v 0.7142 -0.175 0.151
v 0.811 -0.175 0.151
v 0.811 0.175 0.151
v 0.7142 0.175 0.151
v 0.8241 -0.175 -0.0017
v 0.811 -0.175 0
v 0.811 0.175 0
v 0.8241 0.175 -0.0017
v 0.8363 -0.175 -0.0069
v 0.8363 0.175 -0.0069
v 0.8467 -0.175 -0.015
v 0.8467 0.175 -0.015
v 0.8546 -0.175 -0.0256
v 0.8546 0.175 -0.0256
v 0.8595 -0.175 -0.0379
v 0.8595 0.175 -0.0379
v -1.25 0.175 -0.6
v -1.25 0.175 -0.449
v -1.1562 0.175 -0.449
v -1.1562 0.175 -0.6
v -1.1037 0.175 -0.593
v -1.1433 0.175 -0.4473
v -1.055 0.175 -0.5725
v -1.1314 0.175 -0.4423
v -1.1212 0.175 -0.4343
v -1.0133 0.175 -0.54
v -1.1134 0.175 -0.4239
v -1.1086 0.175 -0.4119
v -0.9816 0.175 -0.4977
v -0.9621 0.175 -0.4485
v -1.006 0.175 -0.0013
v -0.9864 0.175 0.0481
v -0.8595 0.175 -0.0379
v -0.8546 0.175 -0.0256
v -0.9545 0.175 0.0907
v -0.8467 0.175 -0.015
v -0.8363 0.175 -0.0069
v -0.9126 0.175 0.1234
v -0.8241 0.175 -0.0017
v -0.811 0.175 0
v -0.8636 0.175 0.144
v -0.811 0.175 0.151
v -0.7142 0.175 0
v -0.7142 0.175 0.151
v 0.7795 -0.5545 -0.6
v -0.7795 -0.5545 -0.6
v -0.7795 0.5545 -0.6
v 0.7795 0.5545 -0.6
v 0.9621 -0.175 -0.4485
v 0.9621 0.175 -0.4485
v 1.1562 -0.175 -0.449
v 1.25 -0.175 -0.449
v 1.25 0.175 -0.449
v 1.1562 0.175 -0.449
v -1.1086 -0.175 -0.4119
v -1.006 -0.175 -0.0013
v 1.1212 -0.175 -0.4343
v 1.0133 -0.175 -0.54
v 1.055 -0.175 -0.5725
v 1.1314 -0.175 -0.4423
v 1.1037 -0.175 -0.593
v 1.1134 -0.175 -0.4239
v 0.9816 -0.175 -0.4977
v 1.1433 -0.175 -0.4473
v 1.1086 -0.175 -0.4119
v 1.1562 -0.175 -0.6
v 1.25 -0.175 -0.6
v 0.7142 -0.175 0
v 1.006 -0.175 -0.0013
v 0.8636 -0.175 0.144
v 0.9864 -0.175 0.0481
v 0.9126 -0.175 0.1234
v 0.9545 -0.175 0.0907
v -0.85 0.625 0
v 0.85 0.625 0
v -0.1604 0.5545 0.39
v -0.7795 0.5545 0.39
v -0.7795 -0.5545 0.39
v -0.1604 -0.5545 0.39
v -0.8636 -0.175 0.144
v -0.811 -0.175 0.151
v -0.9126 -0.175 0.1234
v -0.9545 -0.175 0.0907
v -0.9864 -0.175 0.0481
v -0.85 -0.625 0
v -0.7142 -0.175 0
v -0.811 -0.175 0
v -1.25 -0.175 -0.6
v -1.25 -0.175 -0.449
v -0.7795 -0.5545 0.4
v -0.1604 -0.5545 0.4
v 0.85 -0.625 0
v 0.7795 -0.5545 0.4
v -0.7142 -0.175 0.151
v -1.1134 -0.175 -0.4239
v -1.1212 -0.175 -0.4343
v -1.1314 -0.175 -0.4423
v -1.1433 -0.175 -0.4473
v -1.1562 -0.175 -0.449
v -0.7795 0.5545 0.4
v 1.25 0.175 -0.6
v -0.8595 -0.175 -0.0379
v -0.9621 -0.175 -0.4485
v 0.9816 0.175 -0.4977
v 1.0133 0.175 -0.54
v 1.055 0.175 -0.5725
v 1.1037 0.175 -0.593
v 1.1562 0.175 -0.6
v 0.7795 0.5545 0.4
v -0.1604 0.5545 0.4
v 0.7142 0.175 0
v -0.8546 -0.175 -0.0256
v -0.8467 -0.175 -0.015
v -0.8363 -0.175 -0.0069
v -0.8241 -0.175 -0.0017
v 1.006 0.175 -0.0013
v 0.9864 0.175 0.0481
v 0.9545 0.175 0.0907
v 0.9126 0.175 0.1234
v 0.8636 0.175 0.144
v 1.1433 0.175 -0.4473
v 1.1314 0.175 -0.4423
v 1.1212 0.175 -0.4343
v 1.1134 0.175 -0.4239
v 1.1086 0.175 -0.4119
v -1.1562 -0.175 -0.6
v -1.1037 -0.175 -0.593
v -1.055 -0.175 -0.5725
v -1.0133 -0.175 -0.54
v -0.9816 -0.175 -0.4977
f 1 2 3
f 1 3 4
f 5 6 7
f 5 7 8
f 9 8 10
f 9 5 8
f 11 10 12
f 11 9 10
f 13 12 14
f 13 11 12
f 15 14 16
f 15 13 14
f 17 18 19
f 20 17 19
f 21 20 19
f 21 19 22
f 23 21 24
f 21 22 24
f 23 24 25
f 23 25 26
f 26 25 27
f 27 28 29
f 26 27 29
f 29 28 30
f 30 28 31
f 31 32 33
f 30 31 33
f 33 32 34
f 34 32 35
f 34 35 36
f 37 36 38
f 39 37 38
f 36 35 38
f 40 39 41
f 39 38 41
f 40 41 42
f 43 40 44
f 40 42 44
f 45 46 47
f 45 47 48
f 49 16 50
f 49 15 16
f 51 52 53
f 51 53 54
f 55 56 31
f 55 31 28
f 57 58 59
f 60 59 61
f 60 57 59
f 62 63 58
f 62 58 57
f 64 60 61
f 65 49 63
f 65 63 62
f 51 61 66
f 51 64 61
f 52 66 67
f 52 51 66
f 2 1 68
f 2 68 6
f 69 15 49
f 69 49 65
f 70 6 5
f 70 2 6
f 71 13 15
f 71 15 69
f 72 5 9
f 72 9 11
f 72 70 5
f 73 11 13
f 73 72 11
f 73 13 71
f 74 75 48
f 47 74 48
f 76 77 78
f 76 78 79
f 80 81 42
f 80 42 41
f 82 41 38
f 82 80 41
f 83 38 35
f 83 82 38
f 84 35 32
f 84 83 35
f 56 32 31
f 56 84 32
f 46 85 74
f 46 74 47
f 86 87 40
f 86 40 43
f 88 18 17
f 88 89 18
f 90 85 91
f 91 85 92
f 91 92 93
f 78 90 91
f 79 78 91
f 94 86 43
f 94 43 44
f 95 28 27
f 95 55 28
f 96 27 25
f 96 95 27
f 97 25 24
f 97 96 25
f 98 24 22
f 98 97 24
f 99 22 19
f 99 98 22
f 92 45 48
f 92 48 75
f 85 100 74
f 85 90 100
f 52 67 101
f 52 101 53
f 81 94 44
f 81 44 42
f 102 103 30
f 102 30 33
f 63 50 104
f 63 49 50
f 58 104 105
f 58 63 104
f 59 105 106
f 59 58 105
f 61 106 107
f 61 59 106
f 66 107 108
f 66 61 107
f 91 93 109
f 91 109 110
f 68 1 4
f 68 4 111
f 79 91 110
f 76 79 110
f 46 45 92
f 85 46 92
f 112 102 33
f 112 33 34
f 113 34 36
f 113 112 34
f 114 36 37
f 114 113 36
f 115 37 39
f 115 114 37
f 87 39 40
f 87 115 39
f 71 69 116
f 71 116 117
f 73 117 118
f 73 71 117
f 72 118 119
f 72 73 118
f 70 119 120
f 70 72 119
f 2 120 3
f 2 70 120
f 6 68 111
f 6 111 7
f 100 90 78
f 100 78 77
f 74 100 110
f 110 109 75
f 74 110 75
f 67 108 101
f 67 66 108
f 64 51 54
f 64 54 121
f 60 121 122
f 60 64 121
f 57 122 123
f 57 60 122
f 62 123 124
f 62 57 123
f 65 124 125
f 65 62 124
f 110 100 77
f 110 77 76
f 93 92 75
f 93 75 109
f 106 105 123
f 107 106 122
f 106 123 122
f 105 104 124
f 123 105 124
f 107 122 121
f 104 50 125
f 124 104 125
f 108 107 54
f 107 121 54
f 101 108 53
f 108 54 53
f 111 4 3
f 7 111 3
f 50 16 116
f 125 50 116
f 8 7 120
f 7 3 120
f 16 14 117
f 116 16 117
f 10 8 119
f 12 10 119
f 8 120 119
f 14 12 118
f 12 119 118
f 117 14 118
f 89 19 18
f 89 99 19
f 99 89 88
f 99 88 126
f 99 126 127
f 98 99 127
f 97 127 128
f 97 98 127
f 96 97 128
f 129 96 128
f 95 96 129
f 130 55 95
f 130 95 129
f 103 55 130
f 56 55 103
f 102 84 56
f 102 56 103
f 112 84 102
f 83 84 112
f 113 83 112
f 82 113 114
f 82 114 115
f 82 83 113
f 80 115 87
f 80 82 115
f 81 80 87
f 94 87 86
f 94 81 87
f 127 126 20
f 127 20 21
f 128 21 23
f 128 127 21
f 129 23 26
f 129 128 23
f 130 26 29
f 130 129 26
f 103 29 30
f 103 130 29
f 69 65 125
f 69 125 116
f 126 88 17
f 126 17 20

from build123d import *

# Parameters (mm, degrees)
F1_DEPTH      = 0.625
F3_DEPTH      = 0.851
F3_DEPTH_BACK = 0.851
F5_DEPTH      = 0.175
F6_W          = 0.6190498838
F6_H          = 1.1089384154
F7_DEPTH      = 0.01


with BuildPart() as f1:
    # F0 (on Front) → F1 (new body, symmetric)
    with BuildSketch(Plane.XZ):
        Polygon((-0.7794692077, 0.4), (-0.85, 0), (0, 0), (0, 0.4), align=None)
        Polygon((0, 0), (-0.85, 0), (-0.7794692077, -0.6), (0, -0.6), align=None)
        Polygon((0, 0.4), (0, 0), (0.85, 0), (0.7794692077, 0.4), align=None)
        Polygon((0.85, 0), (0, 0), (0, -0.6), (0.7794692077, -0.6), align=None)
    extrude(amount=F1_DEPTH, both=True)

    # F2 (on Right) → F3 (cut, two sides)
    with BuildSketch(Plane.YZ) as f3_sk:
        Polygon((-0.625, 0.4), (-0.625, 0), (-0.5544692077, 0.4), align=None)
        Polygon((-0.5544692077, -0.6), (-0.625, 0), (-0.625, -0.6), align=None)
        Polygon((0.5544692077, -0.6), (0.625, -0.6), (0.625, 0), align=None)
        Polygon((0.5544692077, 0.4), (0.625, 0), (0.625, 0.4), align=None)
    extrude(amount=-F3_DEPTH, mode=Mode.SUBTRACT)
    extrude(f3_sk.sketch, amount=F3_DEPTH_BACK, mode=Mode.SUBTRACT)

    # F6 (on face) → F7 (cut)
    with BuildSketch(Plane.XY.offset(0.4)):
        with Locations((-0.4699442658, 0)):
            Rectangle(F6_W, F6_H)
    extrude(amount=-F7_DEPTH, mode=Mode.SUBTRACT)


with BuildPart() as f5:
    # F4 (on Front) → F5 (new body, symmetric)
    with BuildSketch(Plane.XZ):
        with BuildLine():
            Line((1.1561552813, -0.6), (1.25, -0.6))
            Line((1.25, -0.6), (1.25, -0.4489999779))
            Line((1.25, -0.4489999779), (1.1561552813, -0.4489999779))
            ThreePointArc((1.1561552813, -0.4489999779), (1.1260000966, -0.438622049), (1.1086183202, -0.4118842403))
            Line((1.1086183202, -0.4118842403), (1.0059598437, -0.001250334))
            ThreePointArc((1.0059598437, -0.001250334), (0.9346590474, 0.1084293105), (0.8109611797, 0.1510000221))
            Line((0.8109611797, 0.1510000221), (0.7142239483, 0.1510000221))
            Line((0.7142239483, 0.1510000221), (0.7142239483, 0))
            Line((0.7142239483, 0), (0.8109611797, 0))
            ThreePointArc((0.8109611797, 0), (0.8417317901, -0.0105897281), (0.8594683047, -0.0378732187))
            Line((0.8594683047, -0.0378732187), (0.9621267813, -0.448507125))
            ThreePointArc((0.9621267813, -0.448507125), (1.0330728394, -0.5576410876), (1.1561552813, -0.6))
        make_face()
    extrude(amount=F5_DEPTH, both=True)


with BuildPart() as f5b:
    # F4 (on Front) → F5, piece 2 (new body, symmetric)
    with BuildSketch(Plane.XZ):
        with BuildLine():
            Line((-1.25, -0.4489999779), (-1.25, -0.6))
            Line((-1.25, -0.6), (-1.1561552813, -0.6))
            ThreePointArc((-1.1561552813, -0.6), (-1.0330728394, -0.5576410876), (-0.9621267813, -0.448507125))
            Line((-0.9621267813, -0.448507125), (-0.8594683047, -0.0378732187))
            ThreePointArc((-0.8594683047, -0.0378732187), (-0.8417317901, -0.0105897281), (-0.8109611797, 0))
            Line((-0.8109611797, 0), (-0.7142239483, 0))
            Line((-0.7142239483, 0), (-0.7142239483, 0.1510000221))
            Line((-0.7142239483, 0.1510000221), (-0.8109611797, 0.1510000221))
            ThreePointArc((-0.8109611797, 0.1510000221), (-0.9346590474, 0.1084293105), (-1.0059598437, -0.001250334))
            Line((-1.0059598437, -0.001250334), (-1.1086183202, -0.4118842403))
            ThreePointArc((-1.1086183202, -0.4118842403), (-1.1260000966, -0.438622049), (-1.1561552813, -0.4489999779))
            Line((-1.1561552813, -0.4489999779), (-1.25, -0.4489999779))
        make_face()
    extrude(amount=F5_DEPTH, both=True)


solid = Compound([f1.part, f5.part, f5b.part])
